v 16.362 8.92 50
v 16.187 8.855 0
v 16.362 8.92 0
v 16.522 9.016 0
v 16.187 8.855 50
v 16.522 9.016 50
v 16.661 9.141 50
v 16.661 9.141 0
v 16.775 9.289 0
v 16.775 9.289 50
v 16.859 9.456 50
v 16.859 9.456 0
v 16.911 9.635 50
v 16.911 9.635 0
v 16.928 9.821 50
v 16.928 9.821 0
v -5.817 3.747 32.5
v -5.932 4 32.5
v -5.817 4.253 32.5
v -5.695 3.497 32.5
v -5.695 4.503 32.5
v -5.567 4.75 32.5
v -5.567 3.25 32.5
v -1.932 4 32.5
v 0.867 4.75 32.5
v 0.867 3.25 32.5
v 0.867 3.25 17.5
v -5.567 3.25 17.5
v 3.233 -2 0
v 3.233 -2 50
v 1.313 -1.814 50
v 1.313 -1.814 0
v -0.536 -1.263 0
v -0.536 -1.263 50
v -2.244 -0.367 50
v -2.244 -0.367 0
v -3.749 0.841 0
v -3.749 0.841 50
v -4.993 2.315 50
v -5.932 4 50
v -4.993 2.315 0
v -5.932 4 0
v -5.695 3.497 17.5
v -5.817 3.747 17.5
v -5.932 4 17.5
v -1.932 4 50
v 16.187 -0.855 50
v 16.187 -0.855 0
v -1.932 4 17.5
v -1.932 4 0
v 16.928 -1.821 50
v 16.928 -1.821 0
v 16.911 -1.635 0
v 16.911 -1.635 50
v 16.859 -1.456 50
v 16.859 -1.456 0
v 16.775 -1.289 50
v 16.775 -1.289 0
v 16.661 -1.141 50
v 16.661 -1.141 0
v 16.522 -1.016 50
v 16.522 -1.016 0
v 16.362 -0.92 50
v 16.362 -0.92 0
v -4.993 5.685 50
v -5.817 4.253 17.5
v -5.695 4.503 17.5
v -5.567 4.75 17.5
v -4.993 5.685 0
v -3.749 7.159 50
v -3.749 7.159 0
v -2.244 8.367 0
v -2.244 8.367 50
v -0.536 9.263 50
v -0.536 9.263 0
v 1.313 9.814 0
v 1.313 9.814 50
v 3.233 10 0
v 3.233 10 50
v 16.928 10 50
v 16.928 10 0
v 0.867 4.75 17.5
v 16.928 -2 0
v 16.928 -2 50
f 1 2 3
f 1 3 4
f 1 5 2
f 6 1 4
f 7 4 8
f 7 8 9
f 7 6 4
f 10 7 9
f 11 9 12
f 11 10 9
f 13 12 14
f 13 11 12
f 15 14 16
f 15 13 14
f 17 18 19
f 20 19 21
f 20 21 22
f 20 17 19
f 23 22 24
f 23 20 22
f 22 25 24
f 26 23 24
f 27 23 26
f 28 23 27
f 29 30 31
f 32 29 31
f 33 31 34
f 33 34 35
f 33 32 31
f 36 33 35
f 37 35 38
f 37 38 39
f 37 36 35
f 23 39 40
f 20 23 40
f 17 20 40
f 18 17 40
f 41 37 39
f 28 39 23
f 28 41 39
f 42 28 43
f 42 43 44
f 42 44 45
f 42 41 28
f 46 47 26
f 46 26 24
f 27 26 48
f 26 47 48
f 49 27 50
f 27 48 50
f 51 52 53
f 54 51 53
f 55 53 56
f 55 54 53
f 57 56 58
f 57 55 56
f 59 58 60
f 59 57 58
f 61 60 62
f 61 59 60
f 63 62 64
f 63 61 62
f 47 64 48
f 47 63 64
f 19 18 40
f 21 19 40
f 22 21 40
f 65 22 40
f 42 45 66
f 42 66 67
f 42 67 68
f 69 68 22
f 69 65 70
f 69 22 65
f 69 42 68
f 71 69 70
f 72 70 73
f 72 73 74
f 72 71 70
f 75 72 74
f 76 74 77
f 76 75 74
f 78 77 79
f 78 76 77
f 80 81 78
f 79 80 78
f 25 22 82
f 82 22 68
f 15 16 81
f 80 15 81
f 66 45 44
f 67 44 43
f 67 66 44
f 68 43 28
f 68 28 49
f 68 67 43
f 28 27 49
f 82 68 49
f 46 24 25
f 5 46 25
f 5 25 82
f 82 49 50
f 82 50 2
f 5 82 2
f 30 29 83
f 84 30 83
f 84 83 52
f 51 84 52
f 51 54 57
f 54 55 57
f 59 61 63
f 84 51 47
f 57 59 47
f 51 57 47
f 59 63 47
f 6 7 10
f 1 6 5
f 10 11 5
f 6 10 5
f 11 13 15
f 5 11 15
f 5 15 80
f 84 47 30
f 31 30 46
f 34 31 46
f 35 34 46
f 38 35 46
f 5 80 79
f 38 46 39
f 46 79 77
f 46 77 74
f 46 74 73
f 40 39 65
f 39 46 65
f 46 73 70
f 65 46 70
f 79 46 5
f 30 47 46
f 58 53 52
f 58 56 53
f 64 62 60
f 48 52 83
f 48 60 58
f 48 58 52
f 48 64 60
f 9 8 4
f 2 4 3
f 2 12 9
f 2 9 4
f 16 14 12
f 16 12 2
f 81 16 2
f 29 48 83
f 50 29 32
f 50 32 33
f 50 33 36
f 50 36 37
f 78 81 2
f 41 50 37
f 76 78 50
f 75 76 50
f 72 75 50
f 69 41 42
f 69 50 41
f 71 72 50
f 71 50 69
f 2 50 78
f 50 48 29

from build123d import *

# Parameters (mm, degrees)
BOSS_EXTRUDE1_DEPTH     = 50
BOSS_EXTRUDE2_DEPTH     = 50
CUT_EXTRUDE1_DEPTH      = 56.88006898
CUT_EXTRUDE1_DEPTH_BACK = 56.88006898
SKETCH3_W               = 15
SKETCH3_H               = 0.75
FILLET1_DEPTH           = 50
FILLET2_DEPTH           = 50
FILLET3_R               = 1


with BuildPart() as part:
    # Sketch1 → Boss-Extrude1 (new body)
    with BuildSketch(Plane.XY):
        Polygon((-4, -2), (16.92820323, -2), (16.92820323, -1.053536475), (-1.931851653, 4), (16.92820323, 9.053536475), (16.92820323, 10), (-4, 10), align=None)
    extrude(amount=BOSS_EXTRUDE1_DEPTH)

    # Sketch2 → Boss-Extrude2 (add)
    with BuildSketch(Plane.XY.offset(50)):
        Polygon((-5.931851653, 4), (-4, 10), (-4, -2), align=None)
    extrude(amount=-BOSS_EXTRUDE2_DEPTH)

    # Sketch3 → Cut-Extrude1 (cut, two sides: drawn at the far end of the back side and taken through both)
    with BuildSketch(Plane(origin=(-5.931851653, 0, 0), x_dir=(0, 0, -1), z_dir=(1, 0, 0)).offset(-CUT_EXTRUDE1_DEPTH_BACK)):
        with Locations((-25, 3.625)):
            Rectangle(SKETCH3_W, SKETCH3_H)
        with Locations((-25, 4.375)):
            Rectangle(SKETCH3_W, SKETCH3_H)
    extrude(amount=CUT_EXTRUDE1_DEPTH + CUT_EXTRUDE1_DEPTH_BACK, mode=Mode.SUBTRACT)

    # Fillet1: read off the stored shape, not the designer's step
    # Fillet1 outline → Fillet1 (cut)
    with BuildSketch(Plane.XY):
        with BuildLine():
            ThreePointArc((-5.931851653, 4), (-2.243925838, 8.366600265), (3.233299737, 10))
            Line((3.233299737, 10), (-4, 10))
            Line((-4, 10), (-5.931851653, 4))
        make_face()
    extrude(amount=FILLET1_DEPTH, mode=Mode.SUBTRACT)

    # Fillet2: read off the stored shape, not the designer's step
    # Fillet2 outline → Fillet2 (cut)
    with BuildSketch(Plane.XY):
        with BuildLine():
            ThreePointArc((3.233299737, -2), (-2.243925838, -0.366600265), (-5.931851653, 4))
            Line((-5.931851653, 4), (-4, -2))
            Line((-4, -2), (3.233299737, -2))
        make_face()
    extrude(amount=FILLET2_DEPTH, mode=Mode.SUBTRACT)

    # Fillet3
    fillet3_edges = [part.edges().sort_by_distance(p)[0] for p in [
        (16.92820323, -1.053536475, 25),
        (16.92820323, 9.053536475, 25),
    ]]
    fillet(fillet3_edges, radius=FILLET3_R)


solid = part.part
